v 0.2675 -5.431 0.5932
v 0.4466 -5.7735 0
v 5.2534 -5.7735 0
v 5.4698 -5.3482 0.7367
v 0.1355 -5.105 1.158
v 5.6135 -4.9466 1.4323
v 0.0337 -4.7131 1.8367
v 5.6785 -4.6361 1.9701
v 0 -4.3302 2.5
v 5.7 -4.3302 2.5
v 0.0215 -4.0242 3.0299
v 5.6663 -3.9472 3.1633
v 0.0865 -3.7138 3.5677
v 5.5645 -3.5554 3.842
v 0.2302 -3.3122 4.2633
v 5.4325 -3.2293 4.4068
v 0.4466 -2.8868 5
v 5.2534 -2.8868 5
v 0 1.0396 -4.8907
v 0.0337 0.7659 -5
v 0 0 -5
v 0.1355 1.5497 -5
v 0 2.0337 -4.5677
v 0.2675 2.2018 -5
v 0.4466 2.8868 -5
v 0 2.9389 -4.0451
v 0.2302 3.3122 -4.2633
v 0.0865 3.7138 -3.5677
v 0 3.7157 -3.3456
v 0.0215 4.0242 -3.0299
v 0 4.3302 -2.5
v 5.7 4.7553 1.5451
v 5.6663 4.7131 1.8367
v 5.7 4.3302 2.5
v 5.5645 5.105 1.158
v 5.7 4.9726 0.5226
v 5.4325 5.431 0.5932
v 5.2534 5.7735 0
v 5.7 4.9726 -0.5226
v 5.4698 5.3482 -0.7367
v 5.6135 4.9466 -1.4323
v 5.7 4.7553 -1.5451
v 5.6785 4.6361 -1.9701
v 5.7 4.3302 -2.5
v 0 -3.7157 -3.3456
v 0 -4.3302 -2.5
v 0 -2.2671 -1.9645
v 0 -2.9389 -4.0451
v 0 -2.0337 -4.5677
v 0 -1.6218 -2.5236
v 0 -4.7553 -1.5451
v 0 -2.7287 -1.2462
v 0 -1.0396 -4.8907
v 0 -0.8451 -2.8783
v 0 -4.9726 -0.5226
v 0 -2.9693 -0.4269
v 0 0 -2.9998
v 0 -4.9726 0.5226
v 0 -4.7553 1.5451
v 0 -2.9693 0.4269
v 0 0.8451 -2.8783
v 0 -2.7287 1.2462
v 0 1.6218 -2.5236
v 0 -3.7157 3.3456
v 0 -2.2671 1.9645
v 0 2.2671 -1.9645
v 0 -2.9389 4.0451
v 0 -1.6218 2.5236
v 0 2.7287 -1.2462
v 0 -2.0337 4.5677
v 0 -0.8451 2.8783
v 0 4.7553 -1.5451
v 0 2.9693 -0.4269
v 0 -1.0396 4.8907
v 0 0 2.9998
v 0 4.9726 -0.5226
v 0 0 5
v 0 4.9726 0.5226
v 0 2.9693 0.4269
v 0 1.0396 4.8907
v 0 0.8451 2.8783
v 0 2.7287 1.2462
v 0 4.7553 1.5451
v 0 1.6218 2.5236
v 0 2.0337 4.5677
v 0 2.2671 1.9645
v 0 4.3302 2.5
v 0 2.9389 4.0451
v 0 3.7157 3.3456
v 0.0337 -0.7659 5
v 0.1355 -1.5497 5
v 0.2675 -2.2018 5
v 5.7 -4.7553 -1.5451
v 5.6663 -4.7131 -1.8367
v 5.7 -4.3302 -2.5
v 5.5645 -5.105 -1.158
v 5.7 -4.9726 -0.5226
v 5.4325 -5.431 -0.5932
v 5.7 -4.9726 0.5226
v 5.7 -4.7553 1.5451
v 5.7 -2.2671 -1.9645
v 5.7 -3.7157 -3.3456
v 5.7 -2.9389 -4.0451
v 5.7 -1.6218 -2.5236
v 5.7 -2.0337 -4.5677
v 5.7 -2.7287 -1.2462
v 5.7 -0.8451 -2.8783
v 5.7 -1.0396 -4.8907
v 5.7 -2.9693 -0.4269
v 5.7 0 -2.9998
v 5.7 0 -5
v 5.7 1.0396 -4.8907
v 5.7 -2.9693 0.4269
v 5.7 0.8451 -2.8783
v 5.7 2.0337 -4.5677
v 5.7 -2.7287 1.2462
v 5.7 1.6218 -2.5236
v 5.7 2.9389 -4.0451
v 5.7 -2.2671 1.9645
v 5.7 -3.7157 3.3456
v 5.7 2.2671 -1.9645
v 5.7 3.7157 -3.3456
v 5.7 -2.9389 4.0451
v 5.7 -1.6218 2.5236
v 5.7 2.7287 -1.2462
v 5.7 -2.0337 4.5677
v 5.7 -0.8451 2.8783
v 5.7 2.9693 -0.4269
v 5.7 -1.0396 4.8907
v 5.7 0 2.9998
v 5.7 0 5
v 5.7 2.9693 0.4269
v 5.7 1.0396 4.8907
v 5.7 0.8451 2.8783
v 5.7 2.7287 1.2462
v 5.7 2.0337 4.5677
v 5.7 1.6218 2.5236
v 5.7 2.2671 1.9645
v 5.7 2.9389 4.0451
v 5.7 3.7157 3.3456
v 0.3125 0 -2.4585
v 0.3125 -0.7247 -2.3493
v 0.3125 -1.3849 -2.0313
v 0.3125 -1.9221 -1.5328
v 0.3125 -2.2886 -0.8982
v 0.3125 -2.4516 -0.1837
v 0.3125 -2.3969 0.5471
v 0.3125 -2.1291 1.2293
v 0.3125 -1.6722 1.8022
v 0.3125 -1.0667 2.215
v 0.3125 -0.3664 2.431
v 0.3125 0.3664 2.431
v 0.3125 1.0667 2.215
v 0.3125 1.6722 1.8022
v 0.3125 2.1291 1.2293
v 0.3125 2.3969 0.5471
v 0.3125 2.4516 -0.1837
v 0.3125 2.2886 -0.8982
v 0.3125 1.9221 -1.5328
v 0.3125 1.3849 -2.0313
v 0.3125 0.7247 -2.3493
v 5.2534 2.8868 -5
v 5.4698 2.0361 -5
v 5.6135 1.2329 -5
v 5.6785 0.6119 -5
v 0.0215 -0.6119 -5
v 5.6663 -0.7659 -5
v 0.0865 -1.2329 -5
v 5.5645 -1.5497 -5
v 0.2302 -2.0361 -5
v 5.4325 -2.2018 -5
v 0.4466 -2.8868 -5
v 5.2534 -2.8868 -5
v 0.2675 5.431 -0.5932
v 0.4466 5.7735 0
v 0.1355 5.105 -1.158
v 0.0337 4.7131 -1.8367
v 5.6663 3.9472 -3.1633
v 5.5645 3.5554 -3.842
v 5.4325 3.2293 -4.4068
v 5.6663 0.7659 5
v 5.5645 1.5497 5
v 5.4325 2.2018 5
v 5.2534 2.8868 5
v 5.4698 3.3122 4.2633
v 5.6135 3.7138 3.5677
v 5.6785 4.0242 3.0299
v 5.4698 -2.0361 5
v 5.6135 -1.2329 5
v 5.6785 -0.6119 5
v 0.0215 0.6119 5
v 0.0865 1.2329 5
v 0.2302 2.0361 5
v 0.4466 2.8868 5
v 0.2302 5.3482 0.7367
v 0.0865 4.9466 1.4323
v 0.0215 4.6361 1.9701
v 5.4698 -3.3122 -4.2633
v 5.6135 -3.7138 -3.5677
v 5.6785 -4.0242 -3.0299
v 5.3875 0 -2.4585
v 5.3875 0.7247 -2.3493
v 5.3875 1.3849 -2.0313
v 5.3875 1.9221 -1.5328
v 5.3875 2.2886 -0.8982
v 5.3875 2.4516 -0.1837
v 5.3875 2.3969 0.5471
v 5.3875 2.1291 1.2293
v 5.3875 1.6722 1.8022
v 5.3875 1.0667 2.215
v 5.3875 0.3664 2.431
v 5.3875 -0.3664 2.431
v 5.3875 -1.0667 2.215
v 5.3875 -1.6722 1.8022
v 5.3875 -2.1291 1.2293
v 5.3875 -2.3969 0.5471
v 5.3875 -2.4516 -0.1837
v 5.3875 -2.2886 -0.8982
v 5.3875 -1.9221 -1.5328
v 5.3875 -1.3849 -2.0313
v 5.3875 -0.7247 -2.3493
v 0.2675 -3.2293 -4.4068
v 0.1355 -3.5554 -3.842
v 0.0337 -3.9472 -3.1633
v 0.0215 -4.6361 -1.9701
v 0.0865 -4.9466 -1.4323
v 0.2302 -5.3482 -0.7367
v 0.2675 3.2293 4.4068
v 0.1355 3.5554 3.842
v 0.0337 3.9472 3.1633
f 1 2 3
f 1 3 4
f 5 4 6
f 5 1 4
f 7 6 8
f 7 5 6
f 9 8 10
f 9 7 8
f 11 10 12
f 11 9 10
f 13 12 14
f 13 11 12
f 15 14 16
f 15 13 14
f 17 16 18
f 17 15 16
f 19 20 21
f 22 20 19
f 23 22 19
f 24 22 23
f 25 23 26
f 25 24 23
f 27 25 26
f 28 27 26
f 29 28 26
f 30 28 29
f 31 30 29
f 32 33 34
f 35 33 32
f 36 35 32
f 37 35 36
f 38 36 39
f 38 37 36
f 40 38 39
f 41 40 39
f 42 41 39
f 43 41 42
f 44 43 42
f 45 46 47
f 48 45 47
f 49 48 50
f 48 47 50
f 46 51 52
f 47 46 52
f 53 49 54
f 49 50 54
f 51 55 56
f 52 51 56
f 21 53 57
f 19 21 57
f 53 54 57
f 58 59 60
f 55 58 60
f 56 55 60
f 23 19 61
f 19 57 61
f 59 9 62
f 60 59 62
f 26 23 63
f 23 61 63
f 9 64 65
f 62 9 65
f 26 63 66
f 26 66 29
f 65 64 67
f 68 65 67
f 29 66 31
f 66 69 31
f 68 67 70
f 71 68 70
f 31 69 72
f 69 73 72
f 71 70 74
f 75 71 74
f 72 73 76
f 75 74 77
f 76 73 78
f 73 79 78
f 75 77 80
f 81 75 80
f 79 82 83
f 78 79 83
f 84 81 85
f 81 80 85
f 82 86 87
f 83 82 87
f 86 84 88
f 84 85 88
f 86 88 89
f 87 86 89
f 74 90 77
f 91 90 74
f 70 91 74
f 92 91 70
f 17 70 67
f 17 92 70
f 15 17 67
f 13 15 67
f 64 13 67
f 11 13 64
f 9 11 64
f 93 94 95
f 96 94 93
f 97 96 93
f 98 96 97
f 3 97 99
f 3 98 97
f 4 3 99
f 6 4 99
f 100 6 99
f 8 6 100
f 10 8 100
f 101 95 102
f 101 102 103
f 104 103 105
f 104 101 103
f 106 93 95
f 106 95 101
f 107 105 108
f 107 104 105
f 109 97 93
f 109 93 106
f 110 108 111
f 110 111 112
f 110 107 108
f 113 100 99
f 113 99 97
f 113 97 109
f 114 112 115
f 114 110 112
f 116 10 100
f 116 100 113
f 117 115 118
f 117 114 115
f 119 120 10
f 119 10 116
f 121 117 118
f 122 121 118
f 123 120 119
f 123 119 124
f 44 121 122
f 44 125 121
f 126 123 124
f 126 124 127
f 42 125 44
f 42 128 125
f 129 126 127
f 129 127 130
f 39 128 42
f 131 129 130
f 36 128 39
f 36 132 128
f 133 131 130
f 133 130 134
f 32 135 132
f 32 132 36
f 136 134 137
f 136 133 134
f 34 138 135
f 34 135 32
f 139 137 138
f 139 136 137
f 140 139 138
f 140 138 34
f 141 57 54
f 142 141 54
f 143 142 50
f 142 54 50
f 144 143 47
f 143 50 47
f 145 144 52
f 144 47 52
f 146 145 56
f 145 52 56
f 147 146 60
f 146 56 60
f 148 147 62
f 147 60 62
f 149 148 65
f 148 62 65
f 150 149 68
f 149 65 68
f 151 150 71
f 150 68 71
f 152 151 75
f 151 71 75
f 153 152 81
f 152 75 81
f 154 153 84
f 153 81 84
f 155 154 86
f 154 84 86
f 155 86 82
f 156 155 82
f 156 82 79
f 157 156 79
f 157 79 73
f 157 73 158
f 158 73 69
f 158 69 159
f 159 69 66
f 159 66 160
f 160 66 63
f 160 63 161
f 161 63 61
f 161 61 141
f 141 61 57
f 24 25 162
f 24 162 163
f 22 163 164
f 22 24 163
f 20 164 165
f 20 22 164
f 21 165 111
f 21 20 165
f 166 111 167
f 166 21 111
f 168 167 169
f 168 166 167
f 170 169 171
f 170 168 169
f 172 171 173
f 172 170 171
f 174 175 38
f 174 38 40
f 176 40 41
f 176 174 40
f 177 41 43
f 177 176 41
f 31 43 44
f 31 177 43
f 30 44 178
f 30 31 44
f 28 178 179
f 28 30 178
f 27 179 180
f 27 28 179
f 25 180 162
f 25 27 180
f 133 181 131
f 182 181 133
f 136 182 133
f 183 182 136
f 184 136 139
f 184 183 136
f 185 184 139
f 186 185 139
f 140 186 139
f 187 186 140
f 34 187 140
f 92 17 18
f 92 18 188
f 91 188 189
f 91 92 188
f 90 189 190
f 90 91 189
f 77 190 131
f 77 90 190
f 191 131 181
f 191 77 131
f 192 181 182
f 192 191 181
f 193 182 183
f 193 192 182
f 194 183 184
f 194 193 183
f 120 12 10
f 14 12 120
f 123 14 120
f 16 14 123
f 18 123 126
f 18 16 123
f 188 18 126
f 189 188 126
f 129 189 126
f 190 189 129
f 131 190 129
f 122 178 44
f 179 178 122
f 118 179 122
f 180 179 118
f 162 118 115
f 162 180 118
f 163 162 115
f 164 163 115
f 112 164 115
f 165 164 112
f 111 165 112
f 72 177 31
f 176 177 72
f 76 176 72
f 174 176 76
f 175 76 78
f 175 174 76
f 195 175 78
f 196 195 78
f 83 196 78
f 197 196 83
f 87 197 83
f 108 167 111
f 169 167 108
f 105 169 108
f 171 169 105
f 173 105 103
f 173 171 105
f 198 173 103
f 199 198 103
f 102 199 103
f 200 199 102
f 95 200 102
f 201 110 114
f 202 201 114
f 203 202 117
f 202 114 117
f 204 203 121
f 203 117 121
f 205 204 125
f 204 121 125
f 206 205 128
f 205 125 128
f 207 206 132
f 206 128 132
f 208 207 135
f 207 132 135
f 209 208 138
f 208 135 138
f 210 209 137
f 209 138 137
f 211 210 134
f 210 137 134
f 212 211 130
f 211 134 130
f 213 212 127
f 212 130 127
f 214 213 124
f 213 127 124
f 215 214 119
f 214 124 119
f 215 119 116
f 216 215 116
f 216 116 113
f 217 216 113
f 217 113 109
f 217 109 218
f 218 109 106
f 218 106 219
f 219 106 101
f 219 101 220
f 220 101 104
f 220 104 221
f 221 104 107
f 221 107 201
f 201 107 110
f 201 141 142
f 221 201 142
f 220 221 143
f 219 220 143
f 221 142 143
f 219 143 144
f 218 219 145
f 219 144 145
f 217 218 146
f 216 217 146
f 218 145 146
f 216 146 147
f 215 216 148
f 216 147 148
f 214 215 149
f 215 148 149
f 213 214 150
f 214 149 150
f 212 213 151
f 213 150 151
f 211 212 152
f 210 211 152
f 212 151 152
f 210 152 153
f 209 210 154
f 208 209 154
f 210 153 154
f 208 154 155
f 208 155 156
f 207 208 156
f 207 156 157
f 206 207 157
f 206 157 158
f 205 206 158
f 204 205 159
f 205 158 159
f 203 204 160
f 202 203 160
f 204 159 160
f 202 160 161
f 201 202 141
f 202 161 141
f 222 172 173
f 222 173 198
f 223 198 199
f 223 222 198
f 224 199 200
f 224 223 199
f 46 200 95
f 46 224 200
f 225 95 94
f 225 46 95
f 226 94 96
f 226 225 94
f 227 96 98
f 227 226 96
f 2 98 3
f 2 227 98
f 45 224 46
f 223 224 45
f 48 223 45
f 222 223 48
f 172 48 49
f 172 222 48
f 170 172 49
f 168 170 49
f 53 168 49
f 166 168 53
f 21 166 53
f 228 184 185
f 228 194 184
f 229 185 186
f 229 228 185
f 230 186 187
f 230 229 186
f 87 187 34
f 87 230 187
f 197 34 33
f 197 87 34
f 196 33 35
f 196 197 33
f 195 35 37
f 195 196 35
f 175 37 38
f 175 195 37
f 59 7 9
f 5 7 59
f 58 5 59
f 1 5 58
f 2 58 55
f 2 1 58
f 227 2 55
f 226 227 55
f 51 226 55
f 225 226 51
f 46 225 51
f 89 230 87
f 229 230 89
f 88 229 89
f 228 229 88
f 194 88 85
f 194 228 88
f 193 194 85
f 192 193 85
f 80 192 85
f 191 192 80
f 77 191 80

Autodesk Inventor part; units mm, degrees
ref_plane "YZ Plane" through (0, 0, 0) normal (1, 0, 0) x (0, 1, 0)
ref_plane "XZ Plane" through (0, 0, 0) normal (0, 1, 0) x (-1, 0, 0)
sketch "Sketch1" plane through (0, 0, 0) normal (1, 0, 0) x (0, 1, 0)
  line L0 (-5.7735, 0) -> (-2.8868, 5)
  line L1 (-2.8868, 5) -> (2.8868, 5)
  line L2 (2.8868, 5) -> (5.7735, 0)
  line L3 (5.7735, 0) -> (2.8868, -5)
  line L4 (2.8868, -5) -> (-2.8868, -5)
  line L5 (-2.8868, -5) -> (-5.7735, 0)
  point P0 (0, 0)
  point P1 (0, 0)
  dimension "d0" = 11.547
extrude "Body" add sketch "Sketch1" along normal blind 5.7
sketch "Sketch2" plane through (0, 0, 0) normal (0, 0, 1) x (1, 0, 0)
  line L0 (0, 2.8868) -> (0, 5.7735) projected
  line L1 (0, 5.7735) -> (5.7, 5.7735) projected
  line L2 (5.7, 2.8868) -> (5.7, 5.7735) projected
  line L3 (-1.14, 0) -> (6.84, 0) projected
  line L4 (0.4466, 5.7735) -> (0, 5)
  line L5 (5.2534, 5.7735) -> (5.7, 5)
  dimension "d3" = 30
  dimension "d4" = 30
  dimension "d5" = 10
  dimension "d6" = 10
revolve "Chamfer1" cut sketch "Sketch2" angle 360 about axis through (-10, 0, 0) along (1, 0, 0)
sketch "Sketch3" plane through (5.7, 0, 0) normal (1, 0, 0) x (0, 0, -1)
  arc A0 (-2.5, -4.3301) -> (2.5, -4.3301) centre (0, 0) ccw projected
hole "Thread" at (5.7, 0, 0) direction (-1, 0, 0) diameter 4.917 end through all thread size "M6x1" designation "M6" class "6H" standard "GB Metric profile"
chamfer "Chamfer2" distance 0.5413 angle 30 1 edges at (5.7, 0, 2.4585) measured on face at (5.7, -4.1286, -0.0988)
chamfer "Chamfer3" distance 0.5413 angle 30 1 edges at (0, 0, 2.4585) measured on face at (0, -4.1286, -0.0988)
ref_plane "Work Plane1" through (-10.6041, 0, 0) normal (0, -0.8660254, -0.5) x (1, 0, 0)
equation "\"d0\" = 1.1547 * SW"
equation "\"d1\" = KOH"
equation "\"d3\" = ANG1"
equation "\"d4\" = ANG2"
equation "\"d5\" = SW0"
equation "\"d6\" = SW01"
equation "\"d8\" = -0.5 * GD1 + 0.5 * NND"
equation "\"d40\" = -0.5 * GD1 + 0.5 * NND"
equation "\"d10\" = -0.5 * GD1 + 0.5 * NND"
equation "\"d41\" = -0.5 * GD1 + 0.5 * NND"
equation "\"ANG1\" = 30deg"
equation "\"ANG2\" = 30deg"
equation "\"NND\" = 6"
equation "\"KOH\" = 5.7"
equation "\"SW0\" = SW"
equation "\"SW01\" = SW"
equation "\"GUL\" = 0.541266 * PTC"
equation "\"THREADDIA\" = 6"
equation "\"TOA\" = 30deg"
equation "\"PTC\" = 1"
equation "\"E0\" = 1.155 * SW"
equation "\"GAL\" = 0.541266 * PTC"
equation "\"SW\" = 10"
equation "\"GD1\" = 4.917468"
properties part number "Nut GB/T 6175 M6" material "Steel, Mild"
